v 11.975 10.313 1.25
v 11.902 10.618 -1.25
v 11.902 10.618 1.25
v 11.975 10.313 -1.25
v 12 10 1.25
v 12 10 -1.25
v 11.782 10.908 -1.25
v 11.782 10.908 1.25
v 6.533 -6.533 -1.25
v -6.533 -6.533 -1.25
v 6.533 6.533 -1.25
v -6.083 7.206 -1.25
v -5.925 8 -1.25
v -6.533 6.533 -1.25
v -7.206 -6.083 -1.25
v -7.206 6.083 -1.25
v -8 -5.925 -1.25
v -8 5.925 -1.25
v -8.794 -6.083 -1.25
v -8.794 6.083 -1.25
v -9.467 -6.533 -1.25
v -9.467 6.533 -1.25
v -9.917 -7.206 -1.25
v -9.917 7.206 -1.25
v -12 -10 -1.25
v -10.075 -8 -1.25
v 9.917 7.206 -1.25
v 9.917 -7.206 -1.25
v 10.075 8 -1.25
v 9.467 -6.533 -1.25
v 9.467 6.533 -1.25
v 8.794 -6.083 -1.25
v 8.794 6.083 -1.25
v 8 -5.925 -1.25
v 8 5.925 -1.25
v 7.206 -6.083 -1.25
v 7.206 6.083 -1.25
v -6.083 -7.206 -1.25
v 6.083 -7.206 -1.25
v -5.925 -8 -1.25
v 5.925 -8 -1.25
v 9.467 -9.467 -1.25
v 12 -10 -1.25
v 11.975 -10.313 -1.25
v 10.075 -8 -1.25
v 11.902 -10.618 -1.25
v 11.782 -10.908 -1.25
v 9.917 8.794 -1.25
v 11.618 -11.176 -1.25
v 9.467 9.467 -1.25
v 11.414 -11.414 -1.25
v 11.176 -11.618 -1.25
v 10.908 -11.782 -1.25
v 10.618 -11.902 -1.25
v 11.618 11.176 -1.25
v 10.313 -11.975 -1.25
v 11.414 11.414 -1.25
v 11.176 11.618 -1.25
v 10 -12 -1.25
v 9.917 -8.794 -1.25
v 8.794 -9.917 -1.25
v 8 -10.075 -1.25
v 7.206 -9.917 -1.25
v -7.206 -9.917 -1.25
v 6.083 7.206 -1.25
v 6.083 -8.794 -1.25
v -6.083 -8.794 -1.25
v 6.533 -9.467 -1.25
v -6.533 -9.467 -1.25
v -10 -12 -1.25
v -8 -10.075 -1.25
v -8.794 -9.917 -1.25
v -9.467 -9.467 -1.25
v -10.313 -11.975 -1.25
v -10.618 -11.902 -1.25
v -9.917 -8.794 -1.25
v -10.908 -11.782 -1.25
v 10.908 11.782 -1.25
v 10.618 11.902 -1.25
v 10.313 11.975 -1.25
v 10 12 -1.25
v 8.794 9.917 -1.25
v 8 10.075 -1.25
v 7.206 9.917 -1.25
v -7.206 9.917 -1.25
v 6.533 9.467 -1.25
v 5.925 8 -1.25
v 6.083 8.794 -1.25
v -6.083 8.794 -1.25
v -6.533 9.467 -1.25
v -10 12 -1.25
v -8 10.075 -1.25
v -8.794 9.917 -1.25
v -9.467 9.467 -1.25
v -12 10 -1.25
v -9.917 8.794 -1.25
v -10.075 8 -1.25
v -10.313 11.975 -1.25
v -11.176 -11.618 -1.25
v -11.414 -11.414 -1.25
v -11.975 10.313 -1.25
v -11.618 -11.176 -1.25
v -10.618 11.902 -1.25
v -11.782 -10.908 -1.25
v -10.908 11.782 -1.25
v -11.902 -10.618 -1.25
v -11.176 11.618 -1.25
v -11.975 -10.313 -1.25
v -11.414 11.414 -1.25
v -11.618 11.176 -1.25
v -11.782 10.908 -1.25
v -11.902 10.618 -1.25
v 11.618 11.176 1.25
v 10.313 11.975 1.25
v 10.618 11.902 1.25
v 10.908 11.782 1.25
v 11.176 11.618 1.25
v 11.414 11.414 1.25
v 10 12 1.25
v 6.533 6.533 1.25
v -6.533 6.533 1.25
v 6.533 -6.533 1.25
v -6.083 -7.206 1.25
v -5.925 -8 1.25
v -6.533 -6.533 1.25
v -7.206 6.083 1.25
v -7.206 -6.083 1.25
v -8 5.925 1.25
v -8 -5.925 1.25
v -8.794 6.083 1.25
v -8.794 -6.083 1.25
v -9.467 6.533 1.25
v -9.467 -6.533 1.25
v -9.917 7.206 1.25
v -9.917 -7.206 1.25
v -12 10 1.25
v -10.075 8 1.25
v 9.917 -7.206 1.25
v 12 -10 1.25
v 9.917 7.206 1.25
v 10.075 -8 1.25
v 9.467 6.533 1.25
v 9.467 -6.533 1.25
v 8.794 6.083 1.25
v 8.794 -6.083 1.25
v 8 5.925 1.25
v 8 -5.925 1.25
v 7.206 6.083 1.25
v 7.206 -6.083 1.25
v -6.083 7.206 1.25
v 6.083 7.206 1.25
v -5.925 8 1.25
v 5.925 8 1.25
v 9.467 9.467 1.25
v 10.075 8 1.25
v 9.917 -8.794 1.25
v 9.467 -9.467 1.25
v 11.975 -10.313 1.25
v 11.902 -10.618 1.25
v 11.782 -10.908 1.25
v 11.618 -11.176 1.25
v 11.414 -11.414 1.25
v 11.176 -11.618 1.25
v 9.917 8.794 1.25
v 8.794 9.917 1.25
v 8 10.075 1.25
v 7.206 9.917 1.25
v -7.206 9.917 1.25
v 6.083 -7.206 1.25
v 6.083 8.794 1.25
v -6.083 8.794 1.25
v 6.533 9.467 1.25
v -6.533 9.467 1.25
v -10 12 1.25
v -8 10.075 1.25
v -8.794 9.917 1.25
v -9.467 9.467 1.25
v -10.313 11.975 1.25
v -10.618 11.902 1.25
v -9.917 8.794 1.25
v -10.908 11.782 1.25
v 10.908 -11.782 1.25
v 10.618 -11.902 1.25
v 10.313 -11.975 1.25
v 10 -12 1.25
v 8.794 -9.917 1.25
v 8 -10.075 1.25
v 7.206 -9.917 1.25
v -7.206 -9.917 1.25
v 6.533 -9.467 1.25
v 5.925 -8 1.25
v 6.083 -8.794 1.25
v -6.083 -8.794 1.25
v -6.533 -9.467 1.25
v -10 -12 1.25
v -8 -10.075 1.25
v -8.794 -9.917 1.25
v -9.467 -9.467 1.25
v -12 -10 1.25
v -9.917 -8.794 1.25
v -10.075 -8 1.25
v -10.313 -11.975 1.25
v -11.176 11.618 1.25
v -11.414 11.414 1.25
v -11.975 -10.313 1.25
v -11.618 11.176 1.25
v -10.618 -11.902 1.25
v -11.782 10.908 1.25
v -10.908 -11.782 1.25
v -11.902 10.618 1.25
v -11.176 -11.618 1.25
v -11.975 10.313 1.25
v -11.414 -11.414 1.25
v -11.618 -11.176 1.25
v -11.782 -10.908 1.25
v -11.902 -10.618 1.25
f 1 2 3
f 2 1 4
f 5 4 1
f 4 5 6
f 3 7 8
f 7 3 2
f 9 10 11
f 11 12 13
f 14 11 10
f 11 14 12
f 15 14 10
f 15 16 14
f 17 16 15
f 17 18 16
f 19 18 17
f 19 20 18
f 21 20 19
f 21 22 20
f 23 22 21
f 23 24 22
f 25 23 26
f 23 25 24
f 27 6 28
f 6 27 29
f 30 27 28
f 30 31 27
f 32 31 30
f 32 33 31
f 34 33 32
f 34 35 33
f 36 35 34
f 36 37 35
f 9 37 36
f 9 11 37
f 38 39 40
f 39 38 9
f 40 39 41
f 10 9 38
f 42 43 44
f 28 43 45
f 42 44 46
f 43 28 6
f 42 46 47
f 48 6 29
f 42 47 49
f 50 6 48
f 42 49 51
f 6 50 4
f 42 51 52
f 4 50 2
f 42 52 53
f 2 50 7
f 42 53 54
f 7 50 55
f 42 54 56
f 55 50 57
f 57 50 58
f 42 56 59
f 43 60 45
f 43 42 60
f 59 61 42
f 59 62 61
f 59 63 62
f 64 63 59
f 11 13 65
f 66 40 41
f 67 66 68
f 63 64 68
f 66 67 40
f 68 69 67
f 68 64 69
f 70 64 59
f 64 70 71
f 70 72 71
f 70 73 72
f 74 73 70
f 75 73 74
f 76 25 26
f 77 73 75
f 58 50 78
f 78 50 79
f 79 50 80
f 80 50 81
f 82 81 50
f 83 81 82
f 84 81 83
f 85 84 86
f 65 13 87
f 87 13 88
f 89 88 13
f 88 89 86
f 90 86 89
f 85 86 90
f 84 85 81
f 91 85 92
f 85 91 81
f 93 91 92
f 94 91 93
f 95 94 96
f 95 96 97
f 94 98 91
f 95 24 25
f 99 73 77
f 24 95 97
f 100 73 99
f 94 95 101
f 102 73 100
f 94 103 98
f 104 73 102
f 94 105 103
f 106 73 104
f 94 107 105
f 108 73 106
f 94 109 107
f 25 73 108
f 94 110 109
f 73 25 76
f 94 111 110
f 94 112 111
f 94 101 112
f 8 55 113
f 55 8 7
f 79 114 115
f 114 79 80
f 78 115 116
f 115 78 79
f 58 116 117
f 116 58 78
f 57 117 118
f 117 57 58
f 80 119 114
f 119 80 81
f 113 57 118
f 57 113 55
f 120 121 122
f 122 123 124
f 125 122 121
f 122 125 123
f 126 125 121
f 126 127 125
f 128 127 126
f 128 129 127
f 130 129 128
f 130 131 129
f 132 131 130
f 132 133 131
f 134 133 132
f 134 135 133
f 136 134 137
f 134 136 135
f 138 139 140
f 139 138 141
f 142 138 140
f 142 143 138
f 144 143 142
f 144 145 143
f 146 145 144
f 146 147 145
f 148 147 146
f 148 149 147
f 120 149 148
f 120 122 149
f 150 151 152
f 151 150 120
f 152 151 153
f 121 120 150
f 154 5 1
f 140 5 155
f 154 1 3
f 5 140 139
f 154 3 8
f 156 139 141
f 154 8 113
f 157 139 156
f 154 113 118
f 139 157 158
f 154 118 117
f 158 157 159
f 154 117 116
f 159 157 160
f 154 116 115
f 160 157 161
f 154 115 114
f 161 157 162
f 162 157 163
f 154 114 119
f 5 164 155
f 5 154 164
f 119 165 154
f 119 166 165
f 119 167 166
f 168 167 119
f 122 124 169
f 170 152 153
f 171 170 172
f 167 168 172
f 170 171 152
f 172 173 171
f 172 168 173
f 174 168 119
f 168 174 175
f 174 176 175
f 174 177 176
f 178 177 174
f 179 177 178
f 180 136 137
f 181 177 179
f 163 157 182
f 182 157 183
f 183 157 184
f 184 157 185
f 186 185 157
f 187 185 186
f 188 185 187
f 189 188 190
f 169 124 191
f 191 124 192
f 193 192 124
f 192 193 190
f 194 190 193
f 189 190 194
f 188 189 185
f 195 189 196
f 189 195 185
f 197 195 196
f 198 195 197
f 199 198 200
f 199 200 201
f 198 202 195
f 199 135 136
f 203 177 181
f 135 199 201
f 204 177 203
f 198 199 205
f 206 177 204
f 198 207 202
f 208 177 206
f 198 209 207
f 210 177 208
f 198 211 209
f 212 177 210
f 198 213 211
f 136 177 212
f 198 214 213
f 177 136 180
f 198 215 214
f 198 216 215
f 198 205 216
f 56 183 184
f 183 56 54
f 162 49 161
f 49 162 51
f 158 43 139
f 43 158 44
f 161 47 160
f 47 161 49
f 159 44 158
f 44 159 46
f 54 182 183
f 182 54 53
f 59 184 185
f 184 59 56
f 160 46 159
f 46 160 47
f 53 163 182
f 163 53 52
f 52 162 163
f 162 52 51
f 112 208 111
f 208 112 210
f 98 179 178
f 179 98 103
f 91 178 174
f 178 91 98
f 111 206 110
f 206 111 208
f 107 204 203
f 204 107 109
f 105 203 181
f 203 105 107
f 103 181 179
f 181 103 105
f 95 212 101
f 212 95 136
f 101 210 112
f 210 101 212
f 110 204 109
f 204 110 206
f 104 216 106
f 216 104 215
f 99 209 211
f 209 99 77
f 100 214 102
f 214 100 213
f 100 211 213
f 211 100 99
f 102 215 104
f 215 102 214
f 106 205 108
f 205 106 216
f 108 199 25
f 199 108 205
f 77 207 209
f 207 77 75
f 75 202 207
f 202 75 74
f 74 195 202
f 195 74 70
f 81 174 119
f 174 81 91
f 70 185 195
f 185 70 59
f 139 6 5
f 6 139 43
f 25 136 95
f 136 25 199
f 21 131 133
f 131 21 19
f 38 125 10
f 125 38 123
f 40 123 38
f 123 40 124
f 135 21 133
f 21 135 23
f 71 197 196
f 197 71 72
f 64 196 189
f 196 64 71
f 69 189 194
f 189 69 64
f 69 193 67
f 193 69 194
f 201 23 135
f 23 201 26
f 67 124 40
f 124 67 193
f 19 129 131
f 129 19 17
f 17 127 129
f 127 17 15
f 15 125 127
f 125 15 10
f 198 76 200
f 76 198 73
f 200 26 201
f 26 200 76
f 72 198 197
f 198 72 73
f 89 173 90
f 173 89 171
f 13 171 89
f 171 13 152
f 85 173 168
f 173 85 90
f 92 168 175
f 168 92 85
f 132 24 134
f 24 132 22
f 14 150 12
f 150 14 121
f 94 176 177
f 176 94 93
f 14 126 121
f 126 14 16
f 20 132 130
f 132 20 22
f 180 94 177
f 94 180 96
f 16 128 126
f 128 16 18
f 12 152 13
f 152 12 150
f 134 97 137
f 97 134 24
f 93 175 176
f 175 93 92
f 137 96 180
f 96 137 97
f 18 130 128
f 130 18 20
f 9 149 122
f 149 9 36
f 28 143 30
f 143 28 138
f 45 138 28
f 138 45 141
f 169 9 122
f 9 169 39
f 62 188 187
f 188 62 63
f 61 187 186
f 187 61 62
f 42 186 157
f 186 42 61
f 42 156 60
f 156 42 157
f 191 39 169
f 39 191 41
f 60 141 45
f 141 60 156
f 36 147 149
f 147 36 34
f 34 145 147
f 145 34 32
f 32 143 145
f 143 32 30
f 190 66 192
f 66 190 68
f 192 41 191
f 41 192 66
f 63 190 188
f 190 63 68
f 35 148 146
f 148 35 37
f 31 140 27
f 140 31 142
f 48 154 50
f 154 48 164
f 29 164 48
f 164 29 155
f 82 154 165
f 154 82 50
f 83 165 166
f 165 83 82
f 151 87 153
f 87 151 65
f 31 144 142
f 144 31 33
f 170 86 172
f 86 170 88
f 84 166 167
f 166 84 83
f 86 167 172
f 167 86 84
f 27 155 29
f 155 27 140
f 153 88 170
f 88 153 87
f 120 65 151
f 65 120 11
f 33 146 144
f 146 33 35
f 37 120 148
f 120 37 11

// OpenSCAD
// Created by Heindal at Thingiverse on March 2015

// Values for user to edit

// Thickness of shim, mounting plate, or standoff
thickness = 2.5; // [1:25]

// Length of shim
length = 24; // [8,12,24,40,56]

// Hole Diameter
holeDia = 4.15; // [3.4:3.4mm for Tap, 4.15:4.15mm for Tight Fit, 4.3:4.3mm for Loose Fit] 

/* [Hidden] */
// Calculated values - edit at your own risk
width = 24;

module rounded_box(l,w,h,r_edge){

cube(size=[l-2*r_edge,w-2*r_edge,h ],center=true);

for (x = [l/2-r_edge,-(l/2-r_edge) ]) {
	for (y = [(w/2-r_edge),-(w/2-r_edge)]) {
		translate([x,y,0]) cylinder(r1=r_edge,r2=r_edge,h=h,center=true,$fn=40);
	}
}
translate([0,w/2-r_edge,0]) cube(size=[l-2*r_edge,2*r_edge,h ],center=true);
translate([0,-(w/2-r_edge),0]) cube(size=[l-2*r_edge,2*r_edge,h ],center=true);
translate([(l/2-r_edge),0,0]) cube(size=[2*r_edge,w-2*r_edge,h ],center=true);
translate([-(l/2-r_edge),0,0]) cube(size=[2*r_edge,w-2*r_edge,h ],center=true);

}

difference() {
	rounded_box(length,width,thickness,2);
	// mounting holes to match the rail
	for (x = [-16*floor(length/16)/2 : 16 : 16*floor(length/16)/2]) {
		for (y = [-8,8]) {
			translate([x,y,0]) cylinder(r=holeDia/2, h=thickness+1, center=true, $fn=16);
		}
	}
}
